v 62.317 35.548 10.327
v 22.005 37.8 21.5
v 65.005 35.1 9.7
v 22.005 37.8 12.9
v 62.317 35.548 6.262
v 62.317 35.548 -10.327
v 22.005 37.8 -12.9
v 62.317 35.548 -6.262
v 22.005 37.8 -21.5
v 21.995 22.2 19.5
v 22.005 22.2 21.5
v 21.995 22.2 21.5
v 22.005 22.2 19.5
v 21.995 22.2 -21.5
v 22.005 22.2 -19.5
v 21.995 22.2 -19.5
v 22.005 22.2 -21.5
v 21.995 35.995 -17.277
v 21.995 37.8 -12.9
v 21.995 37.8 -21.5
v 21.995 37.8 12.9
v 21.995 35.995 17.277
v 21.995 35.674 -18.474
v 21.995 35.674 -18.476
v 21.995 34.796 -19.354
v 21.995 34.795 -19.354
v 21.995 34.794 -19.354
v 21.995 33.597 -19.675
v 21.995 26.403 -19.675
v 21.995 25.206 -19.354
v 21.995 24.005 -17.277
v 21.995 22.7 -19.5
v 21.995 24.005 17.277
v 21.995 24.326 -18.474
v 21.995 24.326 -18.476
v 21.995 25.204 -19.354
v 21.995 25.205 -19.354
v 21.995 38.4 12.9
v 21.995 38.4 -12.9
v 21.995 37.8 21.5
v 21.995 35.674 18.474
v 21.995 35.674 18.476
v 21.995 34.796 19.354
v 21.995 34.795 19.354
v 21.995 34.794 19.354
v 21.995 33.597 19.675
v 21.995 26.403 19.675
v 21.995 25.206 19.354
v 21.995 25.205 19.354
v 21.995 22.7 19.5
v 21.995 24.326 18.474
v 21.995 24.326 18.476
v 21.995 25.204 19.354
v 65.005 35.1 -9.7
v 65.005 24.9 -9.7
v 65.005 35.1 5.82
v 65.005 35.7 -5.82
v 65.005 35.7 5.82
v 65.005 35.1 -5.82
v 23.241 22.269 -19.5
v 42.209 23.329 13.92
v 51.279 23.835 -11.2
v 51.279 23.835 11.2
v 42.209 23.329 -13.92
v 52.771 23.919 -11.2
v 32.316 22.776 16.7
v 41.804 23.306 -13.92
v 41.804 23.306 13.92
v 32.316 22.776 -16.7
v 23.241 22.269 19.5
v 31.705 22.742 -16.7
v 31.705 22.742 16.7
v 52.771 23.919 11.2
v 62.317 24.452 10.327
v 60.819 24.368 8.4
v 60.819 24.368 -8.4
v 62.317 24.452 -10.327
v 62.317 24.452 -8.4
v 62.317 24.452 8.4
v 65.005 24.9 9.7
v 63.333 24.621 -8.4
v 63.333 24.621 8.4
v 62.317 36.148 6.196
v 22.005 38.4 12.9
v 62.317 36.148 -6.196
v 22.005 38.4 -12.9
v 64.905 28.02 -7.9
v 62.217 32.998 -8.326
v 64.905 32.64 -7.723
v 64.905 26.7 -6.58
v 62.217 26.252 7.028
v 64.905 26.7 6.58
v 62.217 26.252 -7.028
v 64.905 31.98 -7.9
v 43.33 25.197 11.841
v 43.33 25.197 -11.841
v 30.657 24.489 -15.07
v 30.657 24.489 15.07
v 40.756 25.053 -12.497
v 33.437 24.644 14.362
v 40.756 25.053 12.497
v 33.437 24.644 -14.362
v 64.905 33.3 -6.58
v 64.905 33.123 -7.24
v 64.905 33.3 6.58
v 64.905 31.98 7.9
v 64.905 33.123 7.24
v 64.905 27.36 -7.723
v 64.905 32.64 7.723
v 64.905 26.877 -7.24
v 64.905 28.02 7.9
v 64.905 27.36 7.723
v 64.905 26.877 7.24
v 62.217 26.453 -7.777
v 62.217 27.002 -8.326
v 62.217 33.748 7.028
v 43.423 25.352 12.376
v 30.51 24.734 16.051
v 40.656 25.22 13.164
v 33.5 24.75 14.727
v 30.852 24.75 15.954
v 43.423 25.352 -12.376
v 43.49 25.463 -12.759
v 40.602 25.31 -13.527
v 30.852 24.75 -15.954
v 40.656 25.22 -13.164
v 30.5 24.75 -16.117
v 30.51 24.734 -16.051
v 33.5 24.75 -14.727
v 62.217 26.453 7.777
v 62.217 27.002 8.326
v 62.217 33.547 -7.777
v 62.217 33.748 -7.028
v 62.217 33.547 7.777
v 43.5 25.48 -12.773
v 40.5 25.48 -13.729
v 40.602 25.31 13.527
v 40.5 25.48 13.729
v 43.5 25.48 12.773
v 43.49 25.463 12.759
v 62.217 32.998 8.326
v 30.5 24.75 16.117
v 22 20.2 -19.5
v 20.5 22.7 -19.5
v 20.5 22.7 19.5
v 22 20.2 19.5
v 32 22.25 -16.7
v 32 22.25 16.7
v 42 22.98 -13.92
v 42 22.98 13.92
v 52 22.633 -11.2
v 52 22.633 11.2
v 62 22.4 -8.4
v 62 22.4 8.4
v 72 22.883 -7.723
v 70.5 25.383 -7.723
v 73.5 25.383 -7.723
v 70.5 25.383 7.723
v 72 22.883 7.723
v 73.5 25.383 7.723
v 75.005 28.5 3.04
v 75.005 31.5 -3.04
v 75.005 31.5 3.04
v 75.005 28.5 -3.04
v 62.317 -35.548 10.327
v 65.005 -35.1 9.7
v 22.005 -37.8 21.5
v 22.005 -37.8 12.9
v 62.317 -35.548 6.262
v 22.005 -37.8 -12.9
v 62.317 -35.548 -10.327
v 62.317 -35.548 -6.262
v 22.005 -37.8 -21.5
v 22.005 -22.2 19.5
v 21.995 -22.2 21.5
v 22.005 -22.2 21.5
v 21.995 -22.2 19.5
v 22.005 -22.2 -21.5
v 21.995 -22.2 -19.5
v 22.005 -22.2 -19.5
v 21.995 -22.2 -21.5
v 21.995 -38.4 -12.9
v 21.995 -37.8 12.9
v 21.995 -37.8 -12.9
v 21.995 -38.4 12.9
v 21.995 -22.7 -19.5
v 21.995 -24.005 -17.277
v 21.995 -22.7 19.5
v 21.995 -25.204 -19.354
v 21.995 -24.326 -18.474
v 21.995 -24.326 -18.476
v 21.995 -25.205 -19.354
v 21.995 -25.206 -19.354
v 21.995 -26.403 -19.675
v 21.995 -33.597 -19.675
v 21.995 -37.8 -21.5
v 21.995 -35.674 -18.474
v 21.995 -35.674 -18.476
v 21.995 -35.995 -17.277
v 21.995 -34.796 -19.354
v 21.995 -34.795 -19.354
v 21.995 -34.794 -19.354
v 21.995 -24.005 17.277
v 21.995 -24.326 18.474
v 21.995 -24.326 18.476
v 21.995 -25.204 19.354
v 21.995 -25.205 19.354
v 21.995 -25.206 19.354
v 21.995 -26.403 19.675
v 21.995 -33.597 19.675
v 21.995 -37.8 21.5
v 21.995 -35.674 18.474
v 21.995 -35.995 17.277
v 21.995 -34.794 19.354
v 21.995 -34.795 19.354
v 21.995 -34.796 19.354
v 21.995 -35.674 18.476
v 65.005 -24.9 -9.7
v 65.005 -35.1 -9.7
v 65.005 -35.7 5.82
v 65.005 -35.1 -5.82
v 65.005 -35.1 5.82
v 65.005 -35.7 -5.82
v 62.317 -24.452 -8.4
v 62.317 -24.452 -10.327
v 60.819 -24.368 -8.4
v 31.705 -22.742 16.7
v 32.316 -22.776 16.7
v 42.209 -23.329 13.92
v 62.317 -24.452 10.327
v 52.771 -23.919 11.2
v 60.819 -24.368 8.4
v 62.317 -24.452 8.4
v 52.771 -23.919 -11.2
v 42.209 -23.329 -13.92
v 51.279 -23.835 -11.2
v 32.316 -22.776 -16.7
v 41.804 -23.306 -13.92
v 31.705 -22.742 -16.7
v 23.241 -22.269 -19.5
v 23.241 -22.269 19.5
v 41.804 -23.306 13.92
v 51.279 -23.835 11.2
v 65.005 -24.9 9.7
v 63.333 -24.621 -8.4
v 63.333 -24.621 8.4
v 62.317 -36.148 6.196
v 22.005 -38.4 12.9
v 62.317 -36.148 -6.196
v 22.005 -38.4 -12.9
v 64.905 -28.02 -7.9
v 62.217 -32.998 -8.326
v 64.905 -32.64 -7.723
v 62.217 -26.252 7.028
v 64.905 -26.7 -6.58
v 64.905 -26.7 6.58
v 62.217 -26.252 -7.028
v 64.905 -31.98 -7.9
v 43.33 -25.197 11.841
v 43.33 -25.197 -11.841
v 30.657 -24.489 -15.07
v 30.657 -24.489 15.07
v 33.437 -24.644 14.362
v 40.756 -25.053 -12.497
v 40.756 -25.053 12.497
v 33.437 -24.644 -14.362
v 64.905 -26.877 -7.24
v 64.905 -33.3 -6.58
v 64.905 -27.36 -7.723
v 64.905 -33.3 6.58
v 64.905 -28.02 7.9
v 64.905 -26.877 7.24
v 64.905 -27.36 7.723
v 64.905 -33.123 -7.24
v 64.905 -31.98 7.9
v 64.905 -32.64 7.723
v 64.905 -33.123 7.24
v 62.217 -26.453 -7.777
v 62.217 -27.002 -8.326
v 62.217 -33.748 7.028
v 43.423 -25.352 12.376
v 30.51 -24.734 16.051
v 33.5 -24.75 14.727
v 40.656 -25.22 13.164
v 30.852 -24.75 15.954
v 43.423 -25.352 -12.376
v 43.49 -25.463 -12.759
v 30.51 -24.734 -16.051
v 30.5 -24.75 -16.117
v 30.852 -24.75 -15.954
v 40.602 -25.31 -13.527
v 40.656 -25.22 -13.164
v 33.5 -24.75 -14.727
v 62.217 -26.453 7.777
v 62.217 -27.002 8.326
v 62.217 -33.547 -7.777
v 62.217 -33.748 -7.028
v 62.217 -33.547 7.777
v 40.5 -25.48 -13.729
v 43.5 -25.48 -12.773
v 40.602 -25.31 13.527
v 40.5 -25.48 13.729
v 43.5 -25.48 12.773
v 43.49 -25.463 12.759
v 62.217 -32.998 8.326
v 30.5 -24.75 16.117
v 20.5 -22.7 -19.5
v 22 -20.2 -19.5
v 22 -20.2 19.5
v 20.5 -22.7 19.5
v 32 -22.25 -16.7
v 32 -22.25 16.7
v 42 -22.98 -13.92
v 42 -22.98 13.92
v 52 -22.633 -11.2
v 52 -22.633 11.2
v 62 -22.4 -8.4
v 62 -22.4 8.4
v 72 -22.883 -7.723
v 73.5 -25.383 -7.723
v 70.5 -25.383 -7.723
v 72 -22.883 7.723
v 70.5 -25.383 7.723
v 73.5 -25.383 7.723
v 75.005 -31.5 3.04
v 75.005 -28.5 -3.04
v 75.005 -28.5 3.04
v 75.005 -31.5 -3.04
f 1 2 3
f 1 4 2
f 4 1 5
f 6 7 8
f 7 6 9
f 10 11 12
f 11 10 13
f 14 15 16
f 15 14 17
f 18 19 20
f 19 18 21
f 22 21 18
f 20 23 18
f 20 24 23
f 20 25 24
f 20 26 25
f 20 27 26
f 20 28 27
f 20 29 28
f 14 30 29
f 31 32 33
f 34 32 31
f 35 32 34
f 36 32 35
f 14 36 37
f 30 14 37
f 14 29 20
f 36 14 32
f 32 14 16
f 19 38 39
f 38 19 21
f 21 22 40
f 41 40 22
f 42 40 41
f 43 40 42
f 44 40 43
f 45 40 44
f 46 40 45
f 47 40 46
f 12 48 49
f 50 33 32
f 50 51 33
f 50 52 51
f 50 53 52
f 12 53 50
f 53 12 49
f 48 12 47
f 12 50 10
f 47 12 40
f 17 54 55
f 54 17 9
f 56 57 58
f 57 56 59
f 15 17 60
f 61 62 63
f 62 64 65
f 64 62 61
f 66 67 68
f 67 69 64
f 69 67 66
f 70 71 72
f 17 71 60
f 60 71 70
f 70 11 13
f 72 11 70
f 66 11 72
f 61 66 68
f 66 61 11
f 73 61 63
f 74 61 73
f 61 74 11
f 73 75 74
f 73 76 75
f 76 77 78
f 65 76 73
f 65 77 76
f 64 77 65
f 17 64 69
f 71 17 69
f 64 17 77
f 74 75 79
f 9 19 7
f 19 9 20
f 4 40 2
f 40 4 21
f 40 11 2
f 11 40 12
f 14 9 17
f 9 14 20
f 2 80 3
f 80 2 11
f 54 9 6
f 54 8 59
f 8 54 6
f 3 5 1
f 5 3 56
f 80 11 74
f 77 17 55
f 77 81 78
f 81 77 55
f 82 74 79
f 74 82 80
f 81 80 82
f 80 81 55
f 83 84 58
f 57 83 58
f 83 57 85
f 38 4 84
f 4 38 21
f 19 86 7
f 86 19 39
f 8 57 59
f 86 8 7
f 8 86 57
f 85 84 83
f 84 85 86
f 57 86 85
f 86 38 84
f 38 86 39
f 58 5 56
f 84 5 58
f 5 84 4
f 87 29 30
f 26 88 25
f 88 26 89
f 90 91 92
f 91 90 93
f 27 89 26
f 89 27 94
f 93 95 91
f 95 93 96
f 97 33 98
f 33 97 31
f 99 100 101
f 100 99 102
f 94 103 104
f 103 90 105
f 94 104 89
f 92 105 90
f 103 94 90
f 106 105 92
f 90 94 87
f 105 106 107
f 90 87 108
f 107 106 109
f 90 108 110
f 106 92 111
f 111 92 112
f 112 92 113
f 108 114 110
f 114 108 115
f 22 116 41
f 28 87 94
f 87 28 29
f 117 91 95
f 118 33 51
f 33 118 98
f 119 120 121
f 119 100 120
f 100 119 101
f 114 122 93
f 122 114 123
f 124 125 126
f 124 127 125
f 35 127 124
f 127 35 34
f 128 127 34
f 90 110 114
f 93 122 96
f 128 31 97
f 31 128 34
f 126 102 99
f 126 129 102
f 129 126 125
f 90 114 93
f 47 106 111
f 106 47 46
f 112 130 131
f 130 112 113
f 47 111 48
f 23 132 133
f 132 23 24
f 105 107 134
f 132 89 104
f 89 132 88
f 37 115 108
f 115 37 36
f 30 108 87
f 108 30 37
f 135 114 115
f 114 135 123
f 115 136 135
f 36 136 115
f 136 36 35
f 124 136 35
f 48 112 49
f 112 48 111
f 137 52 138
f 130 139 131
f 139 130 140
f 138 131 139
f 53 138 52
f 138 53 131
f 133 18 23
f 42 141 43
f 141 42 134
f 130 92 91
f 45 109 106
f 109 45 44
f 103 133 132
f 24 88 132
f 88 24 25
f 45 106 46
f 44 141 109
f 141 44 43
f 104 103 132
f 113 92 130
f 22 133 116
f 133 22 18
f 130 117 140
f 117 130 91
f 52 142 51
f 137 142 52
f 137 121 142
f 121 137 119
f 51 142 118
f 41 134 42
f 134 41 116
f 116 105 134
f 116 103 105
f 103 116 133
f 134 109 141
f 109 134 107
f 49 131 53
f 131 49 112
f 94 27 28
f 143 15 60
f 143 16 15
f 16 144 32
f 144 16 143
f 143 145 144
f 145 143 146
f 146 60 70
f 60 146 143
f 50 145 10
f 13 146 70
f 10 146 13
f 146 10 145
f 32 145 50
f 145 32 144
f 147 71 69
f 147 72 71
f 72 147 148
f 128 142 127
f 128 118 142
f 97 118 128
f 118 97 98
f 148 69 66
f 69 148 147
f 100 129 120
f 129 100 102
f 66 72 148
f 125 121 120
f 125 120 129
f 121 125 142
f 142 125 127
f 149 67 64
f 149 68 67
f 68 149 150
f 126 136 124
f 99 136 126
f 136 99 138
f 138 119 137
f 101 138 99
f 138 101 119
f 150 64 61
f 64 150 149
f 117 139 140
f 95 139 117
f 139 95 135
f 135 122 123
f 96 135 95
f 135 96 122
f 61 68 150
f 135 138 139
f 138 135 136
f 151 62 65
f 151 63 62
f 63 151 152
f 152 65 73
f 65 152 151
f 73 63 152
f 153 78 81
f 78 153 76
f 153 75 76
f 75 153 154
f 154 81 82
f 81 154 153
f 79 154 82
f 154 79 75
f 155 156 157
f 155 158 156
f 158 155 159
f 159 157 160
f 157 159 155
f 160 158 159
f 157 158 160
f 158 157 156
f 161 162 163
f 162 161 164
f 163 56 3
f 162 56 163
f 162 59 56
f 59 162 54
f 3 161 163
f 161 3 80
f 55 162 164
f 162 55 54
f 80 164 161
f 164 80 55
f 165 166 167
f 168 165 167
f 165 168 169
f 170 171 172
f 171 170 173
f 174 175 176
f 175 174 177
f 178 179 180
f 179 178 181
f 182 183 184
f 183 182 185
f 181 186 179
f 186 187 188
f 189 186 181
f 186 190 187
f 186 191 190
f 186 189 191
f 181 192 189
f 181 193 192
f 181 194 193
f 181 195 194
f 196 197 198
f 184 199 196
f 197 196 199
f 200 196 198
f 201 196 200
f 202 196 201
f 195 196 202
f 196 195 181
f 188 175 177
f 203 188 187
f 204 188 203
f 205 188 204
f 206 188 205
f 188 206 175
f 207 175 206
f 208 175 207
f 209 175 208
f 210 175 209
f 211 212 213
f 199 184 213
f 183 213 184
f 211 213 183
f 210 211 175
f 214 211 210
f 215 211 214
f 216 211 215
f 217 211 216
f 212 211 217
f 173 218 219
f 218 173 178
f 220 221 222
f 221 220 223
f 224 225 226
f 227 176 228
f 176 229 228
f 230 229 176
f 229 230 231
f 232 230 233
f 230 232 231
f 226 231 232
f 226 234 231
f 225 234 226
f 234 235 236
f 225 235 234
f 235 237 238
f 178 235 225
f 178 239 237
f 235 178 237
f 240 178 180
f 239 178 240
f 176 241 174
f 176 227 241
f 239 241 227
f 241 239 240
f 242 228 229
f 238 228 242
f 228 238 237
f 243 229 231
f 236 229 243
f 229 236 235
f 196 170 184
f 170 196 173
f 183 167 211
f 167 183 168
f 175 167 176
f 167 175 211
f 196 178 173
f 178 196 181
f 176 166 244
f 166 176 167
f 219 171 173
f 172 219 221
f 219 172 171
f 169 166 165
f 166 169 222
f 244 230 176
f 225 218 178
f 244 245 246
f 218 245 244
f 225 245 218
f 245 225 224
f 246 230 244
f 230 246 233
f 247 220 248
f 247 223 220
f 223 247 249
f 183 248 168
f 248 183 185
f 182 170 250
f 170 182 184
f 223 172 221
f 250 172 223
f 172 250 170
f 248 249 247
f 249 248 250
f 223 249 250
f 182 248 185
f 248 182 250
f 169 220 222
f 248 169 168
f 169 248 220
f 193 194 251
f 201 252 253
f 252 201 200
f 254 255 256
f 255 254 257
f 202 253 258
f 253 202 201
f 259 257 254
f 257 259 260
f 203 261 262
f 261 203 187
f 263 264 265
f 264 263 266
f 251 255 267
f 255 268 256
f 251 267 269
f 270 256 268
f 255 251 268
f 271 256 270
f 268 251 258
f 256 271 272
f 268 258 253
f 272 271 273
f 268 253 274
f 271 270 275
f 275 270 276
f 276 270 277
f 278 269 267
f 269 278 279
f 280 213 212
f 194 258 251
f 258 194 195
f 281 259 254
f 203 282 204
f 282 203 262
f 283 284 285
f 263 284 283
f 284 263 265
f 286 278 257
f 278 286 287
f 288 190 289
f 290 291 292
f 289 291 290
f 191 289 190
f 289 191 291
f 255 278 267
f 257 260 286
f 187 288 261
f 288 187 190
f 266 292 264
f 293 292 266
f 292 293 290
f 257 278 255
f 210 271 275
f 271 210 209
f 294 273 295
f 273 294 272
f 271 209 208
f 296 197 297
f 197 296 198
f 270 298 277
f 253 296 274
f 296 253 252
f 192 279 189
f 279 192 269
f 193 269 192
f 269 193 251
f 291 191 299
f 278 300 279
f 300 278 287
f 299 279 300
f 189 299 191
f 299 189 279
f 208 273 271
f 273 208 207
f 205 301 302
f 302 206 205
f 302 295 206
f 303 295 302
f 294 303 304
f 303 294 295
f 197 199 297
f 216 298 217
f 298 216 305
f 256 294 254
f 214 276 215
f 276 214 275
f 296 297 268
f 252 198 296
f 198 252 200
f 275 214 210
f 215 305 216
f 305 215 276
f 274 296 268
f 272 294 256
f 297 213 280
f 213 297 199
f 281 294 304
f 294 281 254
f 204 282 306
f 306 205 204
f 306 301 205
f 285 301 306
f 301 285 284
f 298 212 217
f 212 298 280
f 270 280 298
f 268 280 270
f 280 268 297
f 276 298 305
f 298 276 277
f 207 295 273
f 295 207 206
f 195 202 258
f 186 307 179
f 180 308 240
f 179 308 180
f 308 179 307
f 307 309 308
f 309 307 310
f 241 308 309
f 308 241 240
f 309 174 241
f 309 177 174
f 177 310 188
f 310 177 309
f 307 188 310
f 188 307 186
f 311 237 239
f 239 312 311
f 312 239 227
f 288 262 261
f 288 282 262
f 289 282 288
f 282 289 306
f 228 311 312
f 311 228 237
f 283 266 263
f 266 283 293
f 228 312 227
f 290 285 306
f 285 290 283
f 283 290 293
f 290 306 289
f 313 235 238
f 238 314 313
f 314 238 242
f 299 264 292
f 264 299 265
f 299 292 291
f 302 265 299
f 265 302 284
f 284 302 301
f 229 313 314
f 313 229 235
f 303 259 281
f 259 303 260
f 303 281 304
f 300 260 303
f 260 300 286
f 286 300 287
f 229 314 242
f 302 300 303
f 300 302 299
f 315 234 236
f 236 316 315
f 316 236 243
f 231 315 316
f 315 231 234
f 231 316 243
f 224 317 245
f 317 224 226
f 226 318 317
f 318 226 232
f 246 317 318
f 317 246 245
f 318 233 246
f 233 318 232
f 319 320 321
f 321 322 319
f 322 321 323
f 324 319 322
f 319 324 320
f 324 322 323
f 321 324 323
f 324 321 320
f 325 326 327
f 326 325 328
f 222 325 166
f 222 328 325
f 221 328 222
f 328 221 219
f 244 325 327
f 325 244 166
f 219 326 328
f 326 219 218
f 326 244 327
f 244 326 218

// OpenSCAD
// ============================================================
//  OMX_F Gripper — Finger Grip Attachment
//  소켓(x=22..65) 슬라이드 끼움 + 바깥 돌출 리지
// ============================================================

// ── USER PARAMETERS ─────────────────────────────────────────

// 소켓 피팅
clearance  = 0.30;  // 블레이드-소켓 갭 (mm) — 빡빡하면 0.40
wall       = 1.8;   // 소켓 외벽 두께 (mm)
clip_lip   = 0.6;   // +Y 스냅 클립 깊이 (mm)

// 팁 연장 (블레이드 끝 x=65 이후 솔리드 캡)
tip_ext    = 10;    // 팁 돌출 길이 (mm) — 0 이면 소켓만

// 바깥 돌출 리지 (그립 면 -Y 바깥쪽)
ridge_pitch  = 10;  // 리지 간격 (mm)
ridge_width  = 3.0; // 리지 베이스 폭 (mm)
ridge_height = 2.0; // 리지 돌출 높이 (mm)
ridge_z_gap  = 2.0; // ±Z 끝단 여백 (mm)

// 표시
show_phantom = false;
which_finger = "both"; // "link6" | "link7" | "both"

// ── BLADE CROSS-SECTION ──────────────────────────────────────
blade_pts = [
    [ 22, 5.7, 19.4 ],
    [ 28, 4.2, 17.7 ],
    [ 36, 3.1, 15.5 ],
    [ 46, 2.8, 12.7 ],
    [ 55, 3.5, 10.3 ],
    [ 62, 3.5,  8.3 ],
    [ 65, 3.0,  7.6 ],
];

X_SOCKET_START = 22;
X_SOCKET_END   = 65;
X_TIP_END      = X_SOCKET_END + tip_ext;

// ── HELPERS ──────────────────────────────────────────────────
function lerp(a, b, t) = a + (b-a)*t;

function seg(x, i=0) =
    (i >= len(blade_pts)-2) ? i :
    (x <= blade_pts[i+1][0]) ? i : seg(x, i+1);

function bhy(x) =
    let(i=seg(x), x0=blade_pts[i][0], x1=blade_pts[i+1][0])
    lerp(blade_pts[i][1], blade_pts[i+1][1], (x-x0)/(x1-x0));

function bhz(x) =
    let(i=seg(x), x0=blade_pts[i][0], x1=blade_pts[i+1][0])
    lerp(blade_pts[i][2], blade_pts[i+1][2], (x-x0)/(x1-x0));

// 소켓 외벽 -Y 면 Y 좌표 및 Z 반높이
function outer_neg_y(x) = -(bhy(x) + wall + clearance);
function outer_hz(x)    =   bhz(x) + wall + clearance;

N = 16;
STL_LINK6 = "model/omx_f_mesh/follower_07_gripper_motorized.stl";

// ── SOCKET ───────────────────────────────────────────────────
module socket_outer() {
    hull()
        for (i = [0:N]) {
            x  = X_SOCKET_START + i*(X_SOCKET_END-X_SOCKET_START)/N;
            hy = bhy(x) + wall + clearance;
            hz = bhz(x) + wall + clearance;
            translate([x, 0, 0])
                cube([0.01, hy*2, hz*2], center=true);
        }
}

// 캐비티: 둥근 모서리 단면으로 blade 곡률 근사
module socket_cavity() {
    translate([-0.1, 0, 0])
    hull()
        for (i = [0:N]) {
            x  = X_SOCKET_START + i*(X_SOCKET_END-X_SOCKET_START)/N;
            hy = bhy(x) + clearance;
            hz = bhz(x) + clearance;
            r  = min(hy * 0.40, 3.0);
            translate([x, 0, 0])
            rotate([0, 90, 0])
            linear_extrude(height=0.01, center=true)
                offset(r=r, $fn=12)
                    square([(hz-r)*2, (hy-r)*2], center=true);
        }
}

module socket_clip() {
    hull()
        for (i = [0:N]) {
            x      = X_SOCKET_START + i*(X_SOCKET_END-X_SOCKET_START)/N;
            hy_out = bhy(x) + wall + clearance;
            hz_out = bhz(x) + wall + clearance;
            translate([x, hy_out, 0])
                cube([0.01, clip_lip*2, hz_out*1.2], center=true);
        }
}

module socket_body() {
    difference() {
        union() { socket_outer(); socket_clip(); }
        socket_cavity();
    }
}

// ── TIP CAP (블레이드 끝 이후 솔리드) ───────────────────────
module tip_cap() {
    if (tip_ext > 0) {
        // x=65 단면에서 팁으로 테이퍼 (half-Y/Z 점점 줄어듦)
        tip_hy = max(1.0, bhy(X_SOCKET_END) * 0.5);
        tip_hz = max(2.0, bhz(X_SOCKET_END) * 0.4);
        hull() {
            translate([X_SOCKET_END, 0, 0])
                cube([0.01,
                      (bhy(X_SOCKET_END)+wall+clearance)*2,
                      (bhz(X_SOCKET_END)+wall+clearance)*2],
                     center=true);
            translate([X_TIP_END, 0, 0])
                cube([0.01, tip_hy*2, tip_hz*2], center=true);
        }
    }
}

// ── 바깥 돌출 리지 ───────────────────────────────────────────
// 소켓 + 팁 전 구간에 걸쳐 -Y 면 바깥으로 삼각 리지 돌출
module ridge_at(x_pos) {
    // 소켓 구간은 blade_pts 보간, 팁 구간은 끝 단면 유지
    x_clamped = min(x_pos, X_SOCKET_END - 0.1);
    fy = outer_neg_y(x_clamped);   // -Y 면 위치
    hz = outer_hz(x_clamped);      // Z 반높이
    tooth_hz = max(1.0, hz - ridge_z_gap);

    linear_extrude(height=tooth_hz*2, center=true)
        polygon([
            [x_pos - ridge_width/2, fy + 0.5],
            [x_pos,                 fy - ridge_height],
            [x_pos + ridge_width/2, fy + 0.5],
        ]);
}

module all_ridges() {
    x_end = X_TIP_END - ridge_width/2;
    for (x = [X_SOCKET_START : ridge_pitch : x_end])
        ridge_at(x);
}

// ── FINGER ───────────────────────────────────────────────────
module finger_link6() {
    socket_body();
    tip_cap();
    all_ridges();
}

module finger_link7() {
    mirror([0, 1, 0]) finger_link6();
}

// ── PHANTOM ──────────────────────────────────────────────────
module finger_phantom_link6() {
    color("cyan", 0.25) import(STL_LINK6, convexity=10);
}
module finger_phantom_link7() {
    mirror([0, 1, 0]) finger_phantom_link6();
}

// ── RENDER ───────────────────────────────────────────────────
SEP = 60;

if (which_finger == "link6") {
    finger_link6();
    if (show_phantom) finger_phantom_link6();
} else if (which_finger == "link7") {
    finger_link7();
    if (show_phantom) finger_phantom_link7();
} else {
    translate([0,  SEP/2, 0]) { finger_link6(); if (show_phantom) finger_phantom_link6(); }
    translate([0, -SEP/2, 0]) { finger_link7(); if (show_phantom) finger_phantom_link7(); }
}

// ============================================================
//  튜닝
//  전체 길이  : tip_ext (팁 연장, 0 = 소켓만, 현재 10 mm)
//               → 소켓 43 mm + tip_ext = 전체 길이
//  리지 간격  : ridge_pitch (현재 10 mm)
//  리지 높이  : ridge_height (현재 2 mm)
//  클리어런스 : clearance (헐거우면 0.20, 빡빡하면 0.40)
//
//  STL 내보내기 전: show_phantom=false, which_finger="link6"/"link7"
// ============================================================
